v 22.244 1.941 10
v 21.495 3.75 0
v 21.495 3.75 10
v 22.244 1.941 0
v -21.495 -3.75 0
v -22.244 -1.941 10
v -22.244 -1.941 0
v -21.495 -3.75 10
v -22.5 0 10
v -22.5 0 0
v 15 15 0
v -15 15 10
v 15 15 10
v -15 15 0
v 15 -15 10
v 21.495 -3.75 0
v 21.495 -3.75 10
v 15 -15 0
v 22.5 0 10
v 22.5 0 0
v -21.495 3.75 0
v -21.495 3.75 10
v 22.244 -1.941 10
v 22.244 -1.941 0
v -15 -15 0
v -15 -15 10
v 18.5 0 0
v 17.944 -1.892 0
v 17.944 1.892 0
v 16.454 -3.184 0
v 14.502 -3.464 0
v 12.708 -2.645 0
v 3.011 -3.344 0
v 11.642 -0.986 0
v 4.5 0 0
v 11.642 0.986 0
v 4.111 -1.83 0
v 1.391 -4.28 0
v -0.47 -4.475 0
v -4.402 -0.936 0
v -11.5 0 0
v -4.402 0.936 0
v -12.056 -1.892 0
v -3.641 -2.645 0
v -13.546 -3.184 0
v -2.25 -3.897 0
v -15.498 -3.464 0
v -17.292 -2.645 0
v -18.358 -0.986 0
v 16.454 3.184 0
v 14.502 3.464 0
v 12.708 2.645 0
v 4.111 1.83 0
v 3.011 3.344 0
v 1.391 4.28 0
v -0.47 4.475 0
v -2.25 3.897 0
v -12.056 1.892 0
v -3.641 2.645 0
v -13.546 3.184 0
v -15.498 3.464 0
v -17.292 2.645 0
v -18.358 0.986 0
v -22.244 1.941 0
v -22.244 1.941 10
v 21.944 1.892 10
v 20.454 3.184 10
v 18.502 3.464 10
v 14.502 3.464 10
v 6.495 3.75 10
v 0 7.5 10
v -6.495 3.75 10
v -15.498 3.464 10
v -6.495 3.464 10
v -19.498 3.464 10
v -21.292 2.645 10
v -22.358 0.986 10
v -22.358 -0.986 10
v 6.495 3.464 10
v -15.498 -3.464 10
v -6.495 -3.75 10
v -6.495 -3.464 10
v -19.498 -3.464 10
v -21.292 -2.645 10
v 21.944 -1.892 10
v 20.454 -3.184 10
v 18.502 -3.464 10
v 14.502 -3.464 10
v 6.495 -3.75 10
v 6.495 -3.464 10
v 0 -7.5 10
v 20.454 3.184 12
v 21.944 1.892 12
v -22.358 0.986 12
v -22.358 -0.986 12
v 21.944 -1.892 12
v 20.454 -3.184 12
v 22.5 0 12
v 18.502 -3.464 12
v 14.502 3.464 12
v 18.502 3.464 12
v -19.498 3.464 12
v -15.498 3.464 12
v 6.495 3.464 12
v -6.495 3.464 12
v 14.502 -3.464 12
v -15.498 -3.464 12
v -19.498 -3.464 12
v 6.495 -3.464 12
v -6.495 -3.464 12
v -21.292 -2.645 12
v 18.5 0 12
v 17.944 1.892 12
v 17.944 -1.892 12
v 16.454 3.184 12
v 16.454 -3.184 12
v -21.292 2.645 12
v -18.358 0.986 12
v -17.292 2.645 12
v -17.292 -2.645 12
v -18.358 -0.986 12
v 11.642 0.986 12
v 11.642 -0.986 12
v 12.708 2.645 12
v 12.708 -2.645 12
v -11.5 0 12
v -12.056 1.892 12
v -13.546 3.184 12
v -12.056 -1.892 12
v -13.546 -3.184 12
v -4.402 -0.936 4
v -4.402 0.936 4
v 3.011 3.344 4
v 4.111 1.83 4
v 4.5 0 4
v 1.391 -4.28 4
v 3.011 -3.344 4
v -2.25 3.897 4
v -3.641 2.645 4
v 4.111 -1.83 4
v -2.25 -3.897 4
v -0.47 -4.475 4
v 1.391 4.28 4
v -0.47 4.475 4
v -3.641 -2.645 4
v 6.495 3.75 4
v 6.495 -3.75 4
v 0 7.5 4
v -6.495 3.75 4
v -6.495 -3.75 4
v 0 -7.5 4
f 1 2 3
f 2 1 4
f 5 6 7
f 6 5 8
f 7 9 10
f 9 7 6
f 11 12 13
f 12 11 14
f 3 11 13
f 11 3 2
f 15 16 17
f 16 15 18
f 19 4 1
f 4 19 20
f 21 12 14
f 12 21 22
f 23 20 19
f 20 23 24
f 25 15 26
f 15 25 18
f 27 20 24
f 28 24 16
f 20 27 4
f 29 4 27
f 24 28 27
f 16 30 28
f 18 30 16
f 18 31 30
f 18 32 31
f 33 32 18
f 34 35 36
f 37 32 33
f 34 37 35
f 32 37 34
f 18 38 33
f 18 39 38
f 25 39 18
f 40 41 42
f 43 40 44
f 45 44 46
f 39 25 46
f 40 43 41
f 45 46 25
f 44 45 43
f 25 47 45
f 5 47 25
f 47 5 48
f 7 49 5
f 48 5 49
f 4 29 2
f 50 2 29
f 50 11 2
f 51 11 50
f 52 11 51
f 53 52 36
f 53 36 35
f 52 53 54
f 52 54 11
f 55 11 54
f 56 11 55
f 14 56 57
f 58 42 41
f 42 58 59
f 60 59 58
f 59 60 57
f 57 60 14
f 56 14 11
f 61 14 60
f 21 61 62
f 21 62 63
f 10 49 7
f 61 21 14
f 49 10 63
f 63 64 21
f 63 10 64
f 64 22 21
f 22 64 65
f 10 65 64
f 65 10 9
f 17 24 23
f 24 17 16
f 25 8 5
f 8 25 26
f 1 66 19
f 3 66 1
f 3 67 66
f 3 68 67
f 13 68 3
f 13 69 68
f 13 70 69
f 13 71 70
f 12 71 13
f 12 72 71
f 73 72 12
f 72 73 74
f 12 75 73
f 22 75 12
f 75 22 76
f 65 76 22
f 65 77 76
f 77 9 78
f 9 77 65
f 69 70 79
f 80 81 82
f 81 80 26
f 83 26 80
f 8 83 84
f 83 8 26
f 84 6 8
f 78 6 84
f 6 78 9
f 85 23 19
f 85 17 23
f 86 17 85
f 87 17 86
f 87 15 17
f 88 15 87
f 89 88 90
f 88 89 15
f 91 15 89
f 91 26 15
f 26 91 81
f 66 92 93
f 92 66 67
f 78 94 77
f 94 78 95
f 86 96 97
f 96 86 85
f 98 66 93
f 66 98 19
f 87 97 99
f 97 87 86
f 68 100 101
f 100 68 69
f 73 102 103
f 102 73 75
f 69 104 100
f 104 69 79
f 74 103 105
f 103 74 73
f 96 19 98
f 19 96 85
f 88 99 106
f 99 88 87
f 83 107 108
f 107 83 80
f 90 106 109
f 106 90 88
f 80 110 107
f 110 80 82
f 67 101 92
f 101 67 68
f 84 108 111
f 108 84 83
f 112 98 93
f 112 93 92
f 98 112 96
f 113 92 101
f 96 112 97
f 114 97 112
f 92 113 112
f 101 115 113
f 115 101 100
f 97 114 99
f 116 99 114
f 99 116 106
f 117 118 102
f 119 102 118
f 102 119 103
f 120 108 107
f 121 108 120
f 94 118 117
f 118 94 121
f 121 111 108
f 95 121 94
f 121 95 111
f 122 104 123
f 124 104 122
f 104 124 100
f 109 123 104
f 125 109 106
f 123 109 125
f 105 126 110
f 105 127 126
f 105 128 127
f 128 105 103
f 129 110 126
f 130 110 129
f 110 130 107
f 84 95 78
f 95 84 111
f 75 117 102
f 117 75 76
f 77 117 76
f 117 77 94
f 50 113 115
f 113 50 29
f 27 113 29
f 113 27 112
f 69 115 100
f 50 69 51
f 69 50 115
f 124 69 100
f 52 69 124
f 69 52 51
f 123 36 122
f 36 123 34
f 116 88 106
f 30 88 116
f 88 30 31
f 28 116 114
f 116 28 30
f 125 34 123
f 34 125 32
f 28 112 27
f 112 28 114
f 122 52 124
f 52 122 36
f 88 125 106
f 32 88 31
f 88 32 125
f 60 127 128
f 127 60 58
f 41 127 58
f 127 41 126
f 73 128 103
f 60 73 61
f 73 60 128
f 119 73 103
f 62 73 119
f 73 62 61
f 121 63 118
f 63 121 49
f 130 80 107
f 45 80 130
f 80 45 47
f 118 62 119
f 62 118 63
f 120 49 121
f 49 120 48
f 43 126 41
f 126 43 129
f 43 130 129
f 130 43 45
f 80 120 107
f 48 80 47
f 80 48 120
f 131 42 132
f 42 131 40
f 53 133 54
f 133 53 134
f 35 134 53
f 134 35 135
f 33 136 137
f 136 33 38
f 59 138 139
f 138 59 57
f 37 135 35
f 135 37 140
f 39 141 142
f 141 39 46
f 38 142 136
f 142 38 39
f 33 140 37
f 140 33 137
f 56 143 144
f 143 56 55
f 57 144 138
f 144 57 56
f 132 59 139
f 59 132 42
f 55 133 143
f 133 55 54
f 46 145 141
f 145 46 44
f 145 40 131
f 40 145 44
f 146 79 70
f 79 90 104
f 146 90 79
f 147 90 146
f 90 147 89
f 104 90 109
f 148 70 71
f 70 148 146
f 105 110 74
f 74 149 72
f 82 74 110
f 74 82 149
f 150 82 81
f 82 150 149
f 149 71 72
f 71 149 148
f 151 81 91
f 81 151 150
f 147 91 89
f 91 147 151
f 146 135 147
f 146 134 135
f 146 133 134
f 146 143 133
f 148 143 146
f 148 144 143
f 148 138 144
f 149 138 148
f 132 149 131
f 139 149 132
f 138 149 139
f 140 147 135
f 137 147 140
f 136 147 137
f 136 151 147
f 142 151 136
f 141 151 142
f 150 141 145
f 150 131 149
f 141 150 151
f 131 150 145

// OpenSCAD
m6_dira = 7;
diry_l = 30;
m8_dira = 9;
m8_hlava = 15;
drazka = 7;

module uchyt_ramene(){
    difference(){
        union(){
            linear_extrude(height = 10){
                hull(){
                    translate([diry_l/2,0])
                        circle(d=15);
                    translate([-diry_l/2,0])
                        circle(d=15);
                    square([diry_l,30],center = true);
                }            
            }
            linear_extrude(height = 12){
                hull(){                    
                    translate([diry_l/2+4,0])
                       circle(d=drazka);
                    translate([-diry_l/2-4,0])
                        circle(d=drazka);

                }
            }    
            
        }
        translate([diry_l/2,0,-1])
            cylinder(d=m6_dira,h=20);
        translate([-diry_l/2,0,-1])
            cylinder(d=m6_dira,h=20);
        
        translate([0,0,-1])
            cylinder(d=m8_dira,h=20);
        rotate([0,0,90])
            translate([0,0,4])
                cylinder(d=m8_hlava,h=16,$fn=6);
    
    }
}

uchyt_ramene();
